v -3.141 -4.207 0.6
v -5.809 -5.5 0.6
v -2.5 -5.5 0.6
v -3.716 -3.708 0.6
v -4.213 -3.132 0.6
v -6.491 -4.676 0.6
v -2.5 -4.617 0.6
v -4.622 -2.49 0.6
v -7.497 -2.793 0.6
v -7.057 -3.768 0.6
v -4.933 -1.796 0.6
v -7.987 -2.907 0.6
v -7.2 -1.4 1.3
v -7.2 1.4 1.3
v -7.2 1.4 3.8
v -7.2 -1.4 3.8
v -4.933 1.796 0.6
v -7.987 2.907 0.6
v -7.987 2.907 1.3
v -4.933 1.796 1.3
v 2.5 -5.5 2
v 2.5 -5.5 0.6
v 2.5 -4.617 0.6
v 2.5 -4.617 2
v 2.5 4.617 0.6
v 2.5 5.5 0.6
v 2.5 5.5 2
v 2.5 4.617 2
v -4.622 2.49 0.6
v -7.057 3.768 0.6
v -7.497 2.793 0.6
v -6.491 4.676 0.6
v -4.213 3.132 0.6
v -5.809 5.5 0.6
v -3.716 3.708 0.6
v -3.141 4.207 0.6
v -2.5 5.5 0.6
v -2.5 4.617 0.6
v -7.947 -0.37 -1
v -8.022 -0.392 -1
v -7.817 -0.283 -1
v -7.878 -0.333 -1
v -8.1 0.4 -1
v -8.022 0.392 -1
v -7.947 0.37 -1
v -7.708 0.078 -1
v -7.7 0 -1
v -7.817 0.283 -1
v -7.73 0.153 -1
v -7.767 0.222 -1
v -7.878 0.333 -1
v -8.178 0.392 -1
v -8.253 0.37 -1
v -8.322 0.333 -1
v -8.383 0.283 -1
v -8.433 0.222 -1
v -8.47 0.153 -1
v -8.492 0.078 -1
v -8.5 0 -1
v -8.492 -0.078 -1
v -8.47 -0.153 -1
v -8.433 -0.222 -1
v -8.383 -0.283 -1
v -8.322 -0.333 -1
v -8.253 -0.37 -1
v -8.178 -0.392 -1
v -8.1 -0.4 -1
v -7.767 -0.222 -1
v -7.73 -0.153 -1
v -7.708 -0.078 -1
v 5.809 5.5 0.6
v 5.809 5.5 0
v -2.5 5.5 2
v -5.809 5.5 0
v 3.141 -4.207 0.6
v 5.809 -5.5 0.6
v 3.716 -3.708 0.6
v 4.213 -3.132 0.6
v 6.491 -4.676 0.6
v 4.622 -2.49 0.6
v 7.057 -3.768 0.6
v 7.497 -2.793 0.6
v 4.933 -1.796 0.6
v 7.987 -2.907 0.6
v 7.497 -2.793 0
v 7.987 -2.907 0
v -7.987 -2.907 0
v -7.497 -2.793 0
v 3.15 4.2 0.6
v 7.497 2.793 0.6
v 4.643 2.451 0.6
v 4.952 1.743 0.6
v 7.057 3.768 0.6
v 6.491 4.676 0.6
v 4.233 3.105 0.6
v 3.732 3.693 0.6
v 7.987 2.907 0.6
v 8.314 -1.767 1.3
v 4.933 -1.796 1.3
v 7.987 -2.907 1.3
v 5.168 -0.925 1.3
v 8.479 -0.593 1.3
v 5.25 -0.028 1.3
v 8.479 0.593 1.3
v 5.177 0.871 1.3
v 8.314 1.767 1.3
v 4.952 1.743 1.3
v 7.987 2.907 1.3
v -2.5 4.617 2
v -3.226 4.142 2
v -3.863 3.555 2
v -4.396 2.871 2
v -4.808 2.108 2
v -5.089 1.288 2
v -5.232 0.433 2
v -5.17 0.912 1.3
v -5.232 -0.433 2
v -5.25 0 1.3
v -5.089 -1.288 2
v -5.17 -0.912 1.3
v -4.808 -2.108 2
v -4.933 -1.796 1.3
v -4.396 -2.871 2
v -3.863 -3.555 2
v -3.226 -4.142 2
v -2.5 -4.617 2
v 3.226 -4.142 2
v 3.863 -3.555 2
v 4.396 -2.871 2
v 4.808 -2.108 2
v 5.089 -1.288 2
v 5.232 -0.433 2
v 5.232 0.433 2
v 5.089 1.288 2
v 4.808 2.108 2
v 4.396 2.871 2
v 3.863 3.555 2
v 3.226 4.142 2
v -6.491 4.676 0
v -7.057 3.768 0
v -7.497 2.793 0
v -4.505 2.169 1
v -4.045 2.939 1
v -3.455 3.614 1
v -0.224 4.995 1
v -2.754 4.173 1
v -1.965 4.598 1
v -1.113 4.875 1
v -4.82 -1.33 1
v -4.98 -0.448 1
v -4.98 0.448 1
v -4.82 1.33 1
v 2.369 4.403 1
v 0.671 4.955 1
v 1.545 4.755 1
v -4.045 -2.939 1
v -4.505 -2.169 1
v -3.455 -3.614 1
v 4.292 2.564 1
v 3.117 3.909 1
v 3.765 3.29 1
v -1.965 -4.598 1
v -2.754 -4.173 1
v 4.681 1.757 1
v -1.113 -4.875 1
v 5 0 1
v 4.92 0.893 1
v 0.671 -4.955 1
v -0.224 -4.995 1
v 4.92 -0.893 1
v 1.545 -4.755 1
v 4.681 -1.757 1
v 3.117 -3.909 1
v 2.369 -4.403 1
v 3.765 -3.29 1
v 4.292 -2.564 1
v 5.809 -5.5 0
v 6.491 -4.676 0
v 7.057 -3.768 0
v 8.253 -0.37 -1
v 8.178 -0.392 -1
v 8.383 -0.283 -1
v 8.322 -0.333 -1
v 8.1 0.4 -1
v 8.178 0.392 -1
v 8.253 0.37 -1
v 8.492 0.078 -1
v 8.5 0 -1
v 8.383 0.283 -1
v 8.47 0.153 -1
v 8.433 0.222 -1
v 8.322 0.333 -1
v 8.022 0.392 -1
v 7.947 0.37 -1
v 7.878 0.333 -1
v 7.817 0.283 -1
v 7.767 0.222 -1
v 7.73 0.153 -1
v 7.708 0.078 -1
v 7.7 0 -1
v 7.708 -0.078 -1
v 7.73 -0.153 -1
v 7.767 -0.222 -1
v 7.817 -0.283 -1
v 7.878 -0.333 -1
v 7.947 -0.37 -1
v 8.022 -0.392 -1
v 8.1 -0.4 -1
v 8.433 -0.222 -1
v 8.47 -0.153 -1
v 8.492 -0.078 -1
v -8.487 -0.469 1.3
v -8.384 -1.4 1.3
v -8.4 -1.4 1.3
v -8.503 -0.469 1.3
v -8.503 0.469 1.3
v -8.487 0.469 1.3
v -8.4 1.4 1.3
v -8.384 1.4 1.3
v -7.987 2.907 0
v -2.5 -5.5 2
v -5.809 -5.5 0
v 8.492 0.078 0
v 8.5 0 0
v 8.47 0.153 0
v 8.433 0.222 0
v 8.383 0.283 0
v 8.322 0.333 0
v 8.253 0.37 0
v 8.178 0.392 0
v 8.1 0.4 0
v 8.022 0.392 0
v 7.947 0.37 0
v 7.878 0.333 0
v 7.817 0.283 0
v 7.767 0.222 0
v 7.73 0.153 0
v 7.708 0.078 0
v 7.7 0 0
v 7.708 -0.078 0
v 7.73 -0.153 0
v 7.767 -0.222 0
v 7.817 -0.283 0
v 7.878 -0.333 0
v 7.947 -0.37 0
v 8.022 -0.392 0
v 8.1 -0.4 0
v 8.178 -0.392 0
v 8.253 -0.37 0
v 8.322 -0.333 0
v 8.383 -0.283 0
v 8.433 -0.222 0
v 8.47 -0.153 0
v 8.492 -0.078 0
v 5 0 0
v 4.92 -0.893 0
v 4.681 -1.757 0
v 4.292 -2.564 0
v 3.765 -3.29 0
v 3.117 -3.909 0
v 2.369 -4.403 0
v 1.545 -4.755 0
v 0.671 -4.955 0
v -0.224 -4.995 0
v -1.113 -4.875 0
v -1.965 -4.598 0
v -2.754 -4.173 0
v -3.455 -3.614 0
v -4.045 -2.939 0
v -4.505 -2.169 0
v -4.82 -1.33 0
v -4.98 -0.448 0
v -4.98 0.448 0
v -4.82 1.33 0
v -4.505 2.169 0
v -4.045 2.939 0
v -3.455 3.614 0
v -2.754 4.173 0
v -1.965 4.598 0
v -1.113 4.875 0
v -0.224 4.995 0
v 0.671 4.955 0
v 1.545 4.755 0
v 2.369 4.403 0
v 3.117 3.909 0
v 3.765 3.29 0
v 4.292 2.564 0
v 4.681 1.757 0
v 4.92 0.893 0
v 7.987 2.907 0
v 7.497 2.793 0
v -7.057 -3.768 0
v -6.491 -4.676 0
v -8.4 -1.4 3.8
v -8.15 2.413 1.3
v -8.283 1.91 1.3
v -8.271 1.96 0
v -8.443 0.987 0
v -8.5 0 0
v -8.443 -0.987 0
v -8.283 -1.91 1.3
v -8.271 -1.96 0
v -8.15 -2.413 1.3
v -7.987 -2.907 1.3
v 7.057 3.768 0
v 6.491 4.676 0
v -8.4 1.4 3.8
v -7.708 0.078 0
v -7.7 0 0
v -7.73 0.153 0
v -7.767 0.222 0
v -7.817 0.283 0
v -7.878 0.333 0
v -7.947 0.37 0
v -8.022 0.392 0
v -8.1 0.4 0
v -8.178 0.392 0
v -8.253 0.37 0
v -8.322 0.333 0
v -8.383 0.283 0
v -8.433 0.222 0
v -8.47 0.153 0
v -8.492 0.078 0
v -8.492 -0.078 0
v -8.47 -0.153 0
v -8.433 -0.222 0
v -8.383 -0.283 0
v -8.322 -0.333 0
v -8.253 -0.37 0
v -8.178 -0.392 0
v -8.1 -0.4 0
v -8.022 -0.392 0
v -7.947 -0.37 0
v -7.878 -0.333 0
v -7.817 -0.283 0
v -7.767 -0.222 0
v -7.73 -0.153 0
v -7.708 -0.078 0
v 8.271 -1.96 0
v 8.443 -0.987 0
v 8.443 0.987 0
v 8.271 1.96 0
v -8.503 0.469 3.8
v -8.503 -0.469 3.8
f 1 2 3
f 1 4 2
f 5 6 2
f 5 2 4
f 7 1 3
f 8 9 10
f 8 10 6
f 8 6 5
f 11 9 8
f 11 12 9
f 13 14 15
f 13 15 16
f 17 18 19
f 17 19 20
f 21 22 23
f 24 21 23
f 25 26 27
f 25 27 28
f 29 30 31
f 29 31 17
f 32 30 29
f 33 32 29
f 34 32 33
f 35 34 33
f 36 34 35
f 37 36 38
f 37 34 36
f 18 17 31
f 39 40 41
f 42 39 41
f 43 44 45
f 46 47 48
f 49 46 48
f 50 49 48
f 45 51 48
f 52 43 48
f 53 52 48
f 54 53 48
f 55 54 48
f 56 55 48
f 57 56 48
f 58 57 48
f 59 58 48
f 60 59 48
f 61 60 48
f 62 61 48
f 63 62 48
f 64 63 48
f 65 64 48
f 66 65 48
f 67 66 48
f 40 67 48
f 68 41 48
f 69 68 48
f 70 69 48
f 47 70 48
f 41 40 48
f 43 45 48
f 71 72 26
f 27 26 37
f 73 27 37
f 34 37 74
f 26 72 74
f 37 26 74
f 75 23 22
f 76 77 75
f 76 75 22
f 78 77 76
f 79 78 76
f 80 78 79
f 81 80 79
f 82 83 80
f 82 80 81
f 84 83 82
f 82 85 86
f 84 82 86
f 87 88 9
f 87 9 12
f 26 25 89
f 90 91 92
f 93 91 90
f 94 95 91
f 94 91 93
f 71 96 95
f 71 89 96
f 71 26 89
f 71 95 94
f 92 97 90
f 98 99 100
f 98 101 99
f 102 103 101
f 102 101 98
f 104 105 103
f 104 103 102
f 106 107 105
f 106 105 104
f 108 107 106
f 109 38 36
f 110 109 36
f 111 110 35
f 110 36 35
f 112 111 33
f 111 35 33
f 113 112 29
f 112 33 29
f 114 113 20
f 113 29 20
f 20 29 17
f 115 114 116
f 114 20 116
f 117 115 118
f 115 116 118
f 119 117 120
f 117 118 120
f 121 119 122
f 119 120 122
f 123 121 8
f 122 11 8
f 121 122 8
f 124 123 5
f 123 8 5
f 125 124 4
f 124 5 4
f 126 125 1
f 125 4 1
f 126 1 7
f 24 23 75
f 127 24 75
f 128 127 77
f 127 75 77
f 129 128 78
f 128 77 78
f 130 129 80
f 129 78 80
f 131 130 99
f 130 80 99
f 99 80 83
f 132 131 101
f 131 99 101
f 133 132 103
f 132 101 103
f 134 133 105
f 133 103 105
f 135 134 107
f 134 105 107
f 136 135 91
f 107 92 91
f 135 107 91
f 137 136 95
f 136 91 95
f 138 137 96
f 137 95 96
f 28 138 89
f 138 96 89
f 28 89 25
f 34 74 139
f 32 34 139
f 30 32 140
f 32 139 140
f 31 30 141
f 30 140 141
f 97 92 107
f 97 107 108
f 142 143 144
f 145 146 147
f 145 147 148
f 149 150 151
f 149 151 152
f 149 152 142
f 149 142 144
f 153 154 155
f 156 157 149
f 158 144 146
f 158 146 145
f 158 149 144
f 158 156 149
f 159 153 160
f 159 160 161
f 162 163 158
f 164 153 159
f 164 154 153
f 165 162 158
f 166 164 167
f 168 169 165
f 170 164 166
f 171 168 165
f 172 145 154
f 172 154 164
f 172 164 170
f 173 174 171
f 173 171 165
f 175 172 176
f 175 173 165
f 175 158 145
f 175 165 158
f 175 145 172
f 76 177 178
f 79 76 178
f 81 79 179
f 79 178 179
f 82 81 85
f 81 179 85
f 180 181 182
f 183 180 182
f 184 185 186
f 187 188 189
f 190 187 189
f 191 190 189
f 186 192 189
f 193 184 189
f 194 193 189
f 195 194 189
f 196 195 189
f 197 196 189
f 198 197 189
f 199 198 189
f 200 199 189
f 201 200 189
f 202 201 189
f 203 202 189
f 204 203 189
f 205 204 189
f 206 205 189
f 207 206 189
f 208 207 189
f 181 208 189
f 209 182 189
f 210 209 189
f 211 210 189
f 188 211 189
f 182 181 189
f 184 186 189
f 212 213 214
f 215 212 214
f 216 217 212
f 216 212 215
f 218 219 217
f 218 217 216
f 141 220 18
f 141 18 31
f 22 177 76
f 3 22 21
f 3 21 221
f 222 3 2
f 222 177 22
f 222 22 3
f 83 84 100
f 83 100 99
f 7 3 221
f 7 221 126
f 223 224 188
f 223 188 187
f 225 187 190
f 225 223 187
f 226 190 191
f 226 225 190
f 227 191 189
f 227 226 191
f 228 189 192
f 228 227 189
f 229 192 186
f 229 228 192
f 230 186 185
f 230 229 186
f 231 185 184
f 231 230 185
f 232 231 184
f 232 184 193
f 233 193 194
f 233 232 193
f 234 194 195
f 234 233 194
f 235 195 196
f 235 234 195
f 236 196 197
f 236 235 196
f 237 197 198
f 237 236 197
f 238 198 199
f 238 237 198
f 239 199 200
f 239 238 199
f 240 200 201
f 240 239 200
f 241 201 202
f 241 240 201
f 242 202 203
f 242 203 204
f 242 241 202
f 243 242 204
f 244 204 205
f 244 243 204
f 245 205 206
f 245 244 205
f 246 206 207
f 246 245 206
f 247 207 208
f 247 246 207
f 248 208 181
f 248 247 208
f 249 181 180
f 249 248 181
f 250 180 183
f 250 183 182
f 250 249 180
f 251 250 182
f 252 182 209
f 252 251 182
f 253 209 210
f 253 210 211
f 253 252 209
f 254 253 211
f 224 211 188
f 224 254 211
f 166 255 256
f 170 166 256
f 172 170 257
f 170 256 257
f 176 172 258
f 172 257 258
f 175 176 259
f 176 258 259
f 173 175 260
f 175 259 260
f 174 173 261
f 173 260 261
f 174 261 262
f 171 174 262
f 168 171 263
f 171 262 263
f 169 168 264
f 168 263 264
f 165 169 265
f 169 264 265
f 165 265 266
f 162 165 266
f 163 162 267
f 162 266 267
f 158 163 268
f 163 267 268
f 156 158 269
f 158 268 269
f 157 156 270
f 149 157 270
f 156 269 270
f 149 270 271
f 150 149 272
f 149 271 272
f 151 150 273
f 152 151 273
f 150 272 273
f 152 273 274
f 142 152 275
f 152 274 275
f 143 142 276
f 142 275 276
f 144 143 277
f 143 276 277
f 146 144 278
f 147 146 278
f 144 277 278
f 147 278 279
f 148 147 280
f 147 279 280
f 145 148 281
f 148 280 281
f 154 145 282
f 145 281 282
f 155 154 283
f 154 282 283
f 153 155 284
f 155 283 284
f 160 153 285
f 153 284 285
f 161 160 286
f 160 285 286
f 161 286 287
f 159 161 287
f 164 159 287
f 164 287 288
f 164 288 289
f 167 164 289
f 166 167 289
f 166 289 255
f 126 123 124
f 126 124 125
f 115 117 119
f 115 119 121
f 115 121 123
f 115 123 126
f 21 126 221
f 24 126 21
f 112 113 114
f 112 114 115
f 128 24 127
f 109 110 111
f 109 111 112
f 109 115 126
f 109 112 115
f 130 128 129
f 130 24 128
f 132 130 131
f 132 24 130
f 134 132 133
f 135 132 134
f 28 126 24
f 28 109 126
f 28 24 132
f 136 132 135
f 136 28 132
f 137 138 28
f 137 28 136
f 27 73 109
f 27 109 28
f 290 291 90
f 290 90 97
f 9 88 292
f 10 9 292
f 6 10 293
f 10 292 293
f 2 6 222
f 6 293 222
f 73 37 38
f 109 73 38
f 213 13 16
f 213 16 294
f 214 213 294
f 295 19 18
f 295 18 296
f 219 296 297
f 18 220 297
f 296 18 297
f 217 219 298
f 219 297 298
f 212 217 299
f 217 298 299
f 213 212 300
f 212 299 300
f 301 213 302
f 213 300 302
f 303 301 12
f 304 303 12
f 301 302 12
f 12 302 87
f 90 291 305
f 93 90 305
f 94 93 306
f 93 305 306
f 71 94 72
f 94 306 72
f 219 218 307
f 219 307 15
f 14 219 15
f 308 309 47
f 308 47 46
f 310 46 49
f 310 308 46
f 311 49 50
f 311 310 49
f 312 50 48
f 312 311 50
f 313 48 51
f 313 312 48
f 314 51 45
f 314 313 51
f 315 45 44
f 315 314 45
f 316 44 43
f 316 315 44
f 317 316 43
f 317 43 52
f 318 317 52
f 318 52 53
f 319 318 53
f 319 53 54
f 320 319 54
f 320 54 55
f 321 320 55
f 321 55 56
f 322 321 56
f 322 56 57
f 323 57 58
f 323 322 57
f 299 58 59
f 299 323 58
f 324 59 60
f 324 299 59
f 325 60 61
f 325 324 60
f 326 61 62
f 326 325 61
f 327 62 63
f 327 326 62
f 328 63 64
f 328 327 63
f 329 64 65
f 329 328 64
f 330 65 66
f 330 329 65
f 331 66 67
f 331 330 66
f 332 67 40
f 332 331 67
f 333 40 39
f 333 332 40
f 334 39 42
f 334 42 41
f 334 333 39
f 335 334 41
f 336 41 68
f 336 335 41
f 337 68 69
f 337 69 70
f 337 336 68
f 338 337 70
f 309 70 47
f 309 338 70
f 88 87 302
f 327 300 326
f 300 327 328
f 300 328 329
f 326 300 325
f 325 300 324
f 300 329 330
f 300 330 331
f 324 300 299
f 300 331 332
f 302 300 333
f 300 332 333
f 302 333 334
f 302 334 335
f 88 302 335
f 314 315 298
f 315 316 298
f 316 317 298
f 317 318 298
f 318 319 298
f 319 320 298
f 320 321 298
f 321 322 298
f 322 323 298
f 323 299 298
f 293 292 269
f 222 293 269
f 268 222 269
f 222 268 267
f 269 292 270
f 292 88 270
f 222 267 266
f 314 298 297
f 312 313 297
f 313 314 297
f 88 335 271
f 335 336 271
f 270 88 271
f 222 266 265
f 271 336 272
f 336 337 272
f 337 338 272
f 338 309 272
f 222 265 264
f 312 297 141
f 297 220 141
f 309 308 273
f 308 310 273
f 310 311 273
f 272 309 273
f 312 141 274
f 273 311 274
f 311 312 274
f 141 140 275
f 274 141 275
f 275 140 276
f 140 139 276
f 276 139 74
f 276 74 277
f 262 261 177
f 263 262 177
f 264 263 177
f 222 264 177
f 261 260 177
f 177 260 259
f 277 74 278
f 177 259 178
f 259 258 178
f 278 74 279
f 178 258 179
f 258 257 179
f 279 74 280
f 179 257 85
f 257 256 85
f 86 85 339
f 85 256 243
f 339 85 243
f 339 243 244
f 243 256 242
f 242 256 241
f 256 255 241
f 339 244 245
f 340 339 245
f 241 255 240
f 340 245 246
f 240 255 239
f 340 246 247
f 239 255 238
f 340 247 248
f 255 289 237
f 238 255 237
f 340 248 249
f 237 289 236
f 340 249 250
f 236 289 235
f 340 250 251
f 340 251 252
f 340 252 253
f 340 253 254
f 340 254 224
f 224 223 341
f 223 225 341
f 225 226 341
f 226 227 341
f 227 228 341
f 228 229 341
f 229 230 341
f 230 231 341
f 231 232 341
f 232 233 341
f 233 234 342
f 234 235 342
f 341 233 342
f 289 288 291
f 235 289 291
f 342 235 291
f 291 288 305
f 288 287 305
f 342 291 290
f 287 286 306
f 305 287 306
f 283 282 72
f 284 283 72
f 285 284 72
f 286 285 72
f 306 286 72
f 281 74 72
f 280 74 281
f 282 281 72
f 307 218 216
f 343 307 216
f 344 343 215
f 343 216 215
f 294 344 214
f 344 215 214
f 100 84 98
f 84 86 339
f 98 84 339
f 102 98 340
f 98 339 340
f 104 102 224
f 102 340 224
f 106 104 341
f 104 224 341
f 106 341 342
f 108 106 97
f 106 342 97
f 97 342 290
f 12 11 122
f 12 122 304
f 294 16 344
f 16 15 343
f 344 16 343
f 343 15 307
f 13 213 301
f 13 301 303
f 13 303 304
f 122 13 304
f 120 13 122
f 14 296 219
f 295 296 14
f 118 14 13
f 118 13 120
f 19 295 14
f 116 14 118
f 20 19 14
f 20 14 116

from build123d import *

# Parameters (mm, degrees)
PAD_DEPTH    = 0.6
PAD001_DEPTH = 0.7
PAD002_DEPTH = 1.4
SKETCH003_R  = 0.4
PAD003_DEPTH = 1
PAD004_DEPTH = 2.5
SKETCH005_R  = 5
POCKET_DEPTH = 1


with BuildPart() as part:
    # Sketch → Pad (new body)
    with BuildSketch(Plane.XY):
        with BuildLine():
            ThreePointArc((-7.987387, 2.907171), (-8.5, 0), (-7.987387, -2.907171))
            Line((-7.496671, -2.792834), (-7.987387, -2.907171))
            ThreePointArc((-7.496671, -2.792834), (-6.789372, -4.231363), (-5.809475, -5.5))
            Line((5.809475, -5.5), (-5.809475, -5.5))
            ThreePointArc((5.809475, -5.5), (6.789372, -4.231363), (7.496671, -2.792834))
            Line((7.496671, -2.792834), (7.987387, -2.907171))
            ThreePointArc((7.987387, -2.907171), (8.5, 0), (7.987387, 2.907171))
            Line((7.496671, 2.792834), (7.987387, 2.907171))
            ThreePointArc((7.496671, 2.792834), (6.789372, 4.231363), (5.809475, 5.5))
            Line((-5.809475, 5.5), (5.809475, 5.5))
            ThreePointArc((-5.809475, 5.5), (-6.789372, 4.231363), (-7.496671, 2.792834))
            Line((-7.987387, 2.907171), (-7.496671, 2.792834))
        make_face()
    extrude(amount=PAD_DEPTH)

    # Sketch001 (on Face14 of Pad) → Pad001 (join)
    with BuildSketch(Plane.XY.offset(0.6)):
        with BuildLine():
            ThreePointArc((-7.987387, 2.907171), (-8.5, 0), (-7.987387, -2.907171))
            Line((-3.037451, -1.105543), (-7.987387, -2.907171))
            ThreePointArc((-3.037451, 1.105543), (-3.232388, 0), (-3.037451, -1.105543))
            Line((-7.987387, 2.907171), (-3.037451, 1.105543))
        make_face()
        with BuildLine():
            ThreePointArc((7.987387, -2.907171), (8.5, 0), (7.987387, 2.907171))
            Line((3.166555, 1.05855), (7.987387, 2.907171))
            ThreePointArc((3.137447, -1.141937), (3.33851, -0.044161), (3.166555, 1.05855))
            Line((7.987387, -2.907171), (3.137447, -1.141937))
        make_face()
    extrude(amount=PAD001_DEPTH)

    # Sketch002 (on Face5 of Pad001) → Pad002 (join)
    with BuildSketch(Plane.XY.offset(0.6)):
        with BuildLine():
            Line((-2.5, 5.5), (-2.5, 4.616546))
            ThreePointArc((-2.5, 4.616546), (-5.25, 0), (-2.5, -4.616546))
            Line((-2.5, -5.5), (-2.5, -4.616546))
            Line((2.5, -5.5), (-2.5, -5.5))
            Line((2.5, -5.5), (2.5, -4.616546))
            ThreePointArc((2.5, -4.616546), (5.25, 0), (2.5, 4.616546))
            Line((2.5, 5.5), (2.5, 4.616546))
            Line((2.5, 5.5), (-2.5, 5.5))
        make_face()
    extrude(amount=PAD002_DEPTH)

    # Sketch003 → Pad003 (join)
    with BuildSketch(Plane.XY):
        with Locations((-8.1, 0)):
            Circle(SKETCH003_R)
        with Locations((8.1, 0)):
            Circle(SKETCH003_R)
    extrude(amount=-PAD003_DEPTH)

    # Sketch004 (on Face37 of Pad003) → Pad004 (join)
    with BuildSketch(Plane.XY.offset(1.3)):
        with BuildLine():
            Line((-8.4, 1.4), (-7.2, 1.4))
            Line((-7.2, 1.4), (-7.2, -1.4))
            Line((-7.2, -1.4), (-8.4, -1.4))
            ThreePointArc((-8.4, 1.4), (-8.515868, 0), (-8.4, -1.4))
        make_face()
    extrude(amount=PAD004_DEPTH)

    # Sketch005 (on Face4 of Pad004) → Pocket (cut)
    with BuildSketch(Plane(origin=(0, 0, 0), x_dir=(1, 0, 0), z_dir=(0, 0, -1))):
        Circle(SKETCH005_R)
    extrude(amount=-POCKET_DEPTH, mode=Mode.SUBTRACT)


solid = part.part
